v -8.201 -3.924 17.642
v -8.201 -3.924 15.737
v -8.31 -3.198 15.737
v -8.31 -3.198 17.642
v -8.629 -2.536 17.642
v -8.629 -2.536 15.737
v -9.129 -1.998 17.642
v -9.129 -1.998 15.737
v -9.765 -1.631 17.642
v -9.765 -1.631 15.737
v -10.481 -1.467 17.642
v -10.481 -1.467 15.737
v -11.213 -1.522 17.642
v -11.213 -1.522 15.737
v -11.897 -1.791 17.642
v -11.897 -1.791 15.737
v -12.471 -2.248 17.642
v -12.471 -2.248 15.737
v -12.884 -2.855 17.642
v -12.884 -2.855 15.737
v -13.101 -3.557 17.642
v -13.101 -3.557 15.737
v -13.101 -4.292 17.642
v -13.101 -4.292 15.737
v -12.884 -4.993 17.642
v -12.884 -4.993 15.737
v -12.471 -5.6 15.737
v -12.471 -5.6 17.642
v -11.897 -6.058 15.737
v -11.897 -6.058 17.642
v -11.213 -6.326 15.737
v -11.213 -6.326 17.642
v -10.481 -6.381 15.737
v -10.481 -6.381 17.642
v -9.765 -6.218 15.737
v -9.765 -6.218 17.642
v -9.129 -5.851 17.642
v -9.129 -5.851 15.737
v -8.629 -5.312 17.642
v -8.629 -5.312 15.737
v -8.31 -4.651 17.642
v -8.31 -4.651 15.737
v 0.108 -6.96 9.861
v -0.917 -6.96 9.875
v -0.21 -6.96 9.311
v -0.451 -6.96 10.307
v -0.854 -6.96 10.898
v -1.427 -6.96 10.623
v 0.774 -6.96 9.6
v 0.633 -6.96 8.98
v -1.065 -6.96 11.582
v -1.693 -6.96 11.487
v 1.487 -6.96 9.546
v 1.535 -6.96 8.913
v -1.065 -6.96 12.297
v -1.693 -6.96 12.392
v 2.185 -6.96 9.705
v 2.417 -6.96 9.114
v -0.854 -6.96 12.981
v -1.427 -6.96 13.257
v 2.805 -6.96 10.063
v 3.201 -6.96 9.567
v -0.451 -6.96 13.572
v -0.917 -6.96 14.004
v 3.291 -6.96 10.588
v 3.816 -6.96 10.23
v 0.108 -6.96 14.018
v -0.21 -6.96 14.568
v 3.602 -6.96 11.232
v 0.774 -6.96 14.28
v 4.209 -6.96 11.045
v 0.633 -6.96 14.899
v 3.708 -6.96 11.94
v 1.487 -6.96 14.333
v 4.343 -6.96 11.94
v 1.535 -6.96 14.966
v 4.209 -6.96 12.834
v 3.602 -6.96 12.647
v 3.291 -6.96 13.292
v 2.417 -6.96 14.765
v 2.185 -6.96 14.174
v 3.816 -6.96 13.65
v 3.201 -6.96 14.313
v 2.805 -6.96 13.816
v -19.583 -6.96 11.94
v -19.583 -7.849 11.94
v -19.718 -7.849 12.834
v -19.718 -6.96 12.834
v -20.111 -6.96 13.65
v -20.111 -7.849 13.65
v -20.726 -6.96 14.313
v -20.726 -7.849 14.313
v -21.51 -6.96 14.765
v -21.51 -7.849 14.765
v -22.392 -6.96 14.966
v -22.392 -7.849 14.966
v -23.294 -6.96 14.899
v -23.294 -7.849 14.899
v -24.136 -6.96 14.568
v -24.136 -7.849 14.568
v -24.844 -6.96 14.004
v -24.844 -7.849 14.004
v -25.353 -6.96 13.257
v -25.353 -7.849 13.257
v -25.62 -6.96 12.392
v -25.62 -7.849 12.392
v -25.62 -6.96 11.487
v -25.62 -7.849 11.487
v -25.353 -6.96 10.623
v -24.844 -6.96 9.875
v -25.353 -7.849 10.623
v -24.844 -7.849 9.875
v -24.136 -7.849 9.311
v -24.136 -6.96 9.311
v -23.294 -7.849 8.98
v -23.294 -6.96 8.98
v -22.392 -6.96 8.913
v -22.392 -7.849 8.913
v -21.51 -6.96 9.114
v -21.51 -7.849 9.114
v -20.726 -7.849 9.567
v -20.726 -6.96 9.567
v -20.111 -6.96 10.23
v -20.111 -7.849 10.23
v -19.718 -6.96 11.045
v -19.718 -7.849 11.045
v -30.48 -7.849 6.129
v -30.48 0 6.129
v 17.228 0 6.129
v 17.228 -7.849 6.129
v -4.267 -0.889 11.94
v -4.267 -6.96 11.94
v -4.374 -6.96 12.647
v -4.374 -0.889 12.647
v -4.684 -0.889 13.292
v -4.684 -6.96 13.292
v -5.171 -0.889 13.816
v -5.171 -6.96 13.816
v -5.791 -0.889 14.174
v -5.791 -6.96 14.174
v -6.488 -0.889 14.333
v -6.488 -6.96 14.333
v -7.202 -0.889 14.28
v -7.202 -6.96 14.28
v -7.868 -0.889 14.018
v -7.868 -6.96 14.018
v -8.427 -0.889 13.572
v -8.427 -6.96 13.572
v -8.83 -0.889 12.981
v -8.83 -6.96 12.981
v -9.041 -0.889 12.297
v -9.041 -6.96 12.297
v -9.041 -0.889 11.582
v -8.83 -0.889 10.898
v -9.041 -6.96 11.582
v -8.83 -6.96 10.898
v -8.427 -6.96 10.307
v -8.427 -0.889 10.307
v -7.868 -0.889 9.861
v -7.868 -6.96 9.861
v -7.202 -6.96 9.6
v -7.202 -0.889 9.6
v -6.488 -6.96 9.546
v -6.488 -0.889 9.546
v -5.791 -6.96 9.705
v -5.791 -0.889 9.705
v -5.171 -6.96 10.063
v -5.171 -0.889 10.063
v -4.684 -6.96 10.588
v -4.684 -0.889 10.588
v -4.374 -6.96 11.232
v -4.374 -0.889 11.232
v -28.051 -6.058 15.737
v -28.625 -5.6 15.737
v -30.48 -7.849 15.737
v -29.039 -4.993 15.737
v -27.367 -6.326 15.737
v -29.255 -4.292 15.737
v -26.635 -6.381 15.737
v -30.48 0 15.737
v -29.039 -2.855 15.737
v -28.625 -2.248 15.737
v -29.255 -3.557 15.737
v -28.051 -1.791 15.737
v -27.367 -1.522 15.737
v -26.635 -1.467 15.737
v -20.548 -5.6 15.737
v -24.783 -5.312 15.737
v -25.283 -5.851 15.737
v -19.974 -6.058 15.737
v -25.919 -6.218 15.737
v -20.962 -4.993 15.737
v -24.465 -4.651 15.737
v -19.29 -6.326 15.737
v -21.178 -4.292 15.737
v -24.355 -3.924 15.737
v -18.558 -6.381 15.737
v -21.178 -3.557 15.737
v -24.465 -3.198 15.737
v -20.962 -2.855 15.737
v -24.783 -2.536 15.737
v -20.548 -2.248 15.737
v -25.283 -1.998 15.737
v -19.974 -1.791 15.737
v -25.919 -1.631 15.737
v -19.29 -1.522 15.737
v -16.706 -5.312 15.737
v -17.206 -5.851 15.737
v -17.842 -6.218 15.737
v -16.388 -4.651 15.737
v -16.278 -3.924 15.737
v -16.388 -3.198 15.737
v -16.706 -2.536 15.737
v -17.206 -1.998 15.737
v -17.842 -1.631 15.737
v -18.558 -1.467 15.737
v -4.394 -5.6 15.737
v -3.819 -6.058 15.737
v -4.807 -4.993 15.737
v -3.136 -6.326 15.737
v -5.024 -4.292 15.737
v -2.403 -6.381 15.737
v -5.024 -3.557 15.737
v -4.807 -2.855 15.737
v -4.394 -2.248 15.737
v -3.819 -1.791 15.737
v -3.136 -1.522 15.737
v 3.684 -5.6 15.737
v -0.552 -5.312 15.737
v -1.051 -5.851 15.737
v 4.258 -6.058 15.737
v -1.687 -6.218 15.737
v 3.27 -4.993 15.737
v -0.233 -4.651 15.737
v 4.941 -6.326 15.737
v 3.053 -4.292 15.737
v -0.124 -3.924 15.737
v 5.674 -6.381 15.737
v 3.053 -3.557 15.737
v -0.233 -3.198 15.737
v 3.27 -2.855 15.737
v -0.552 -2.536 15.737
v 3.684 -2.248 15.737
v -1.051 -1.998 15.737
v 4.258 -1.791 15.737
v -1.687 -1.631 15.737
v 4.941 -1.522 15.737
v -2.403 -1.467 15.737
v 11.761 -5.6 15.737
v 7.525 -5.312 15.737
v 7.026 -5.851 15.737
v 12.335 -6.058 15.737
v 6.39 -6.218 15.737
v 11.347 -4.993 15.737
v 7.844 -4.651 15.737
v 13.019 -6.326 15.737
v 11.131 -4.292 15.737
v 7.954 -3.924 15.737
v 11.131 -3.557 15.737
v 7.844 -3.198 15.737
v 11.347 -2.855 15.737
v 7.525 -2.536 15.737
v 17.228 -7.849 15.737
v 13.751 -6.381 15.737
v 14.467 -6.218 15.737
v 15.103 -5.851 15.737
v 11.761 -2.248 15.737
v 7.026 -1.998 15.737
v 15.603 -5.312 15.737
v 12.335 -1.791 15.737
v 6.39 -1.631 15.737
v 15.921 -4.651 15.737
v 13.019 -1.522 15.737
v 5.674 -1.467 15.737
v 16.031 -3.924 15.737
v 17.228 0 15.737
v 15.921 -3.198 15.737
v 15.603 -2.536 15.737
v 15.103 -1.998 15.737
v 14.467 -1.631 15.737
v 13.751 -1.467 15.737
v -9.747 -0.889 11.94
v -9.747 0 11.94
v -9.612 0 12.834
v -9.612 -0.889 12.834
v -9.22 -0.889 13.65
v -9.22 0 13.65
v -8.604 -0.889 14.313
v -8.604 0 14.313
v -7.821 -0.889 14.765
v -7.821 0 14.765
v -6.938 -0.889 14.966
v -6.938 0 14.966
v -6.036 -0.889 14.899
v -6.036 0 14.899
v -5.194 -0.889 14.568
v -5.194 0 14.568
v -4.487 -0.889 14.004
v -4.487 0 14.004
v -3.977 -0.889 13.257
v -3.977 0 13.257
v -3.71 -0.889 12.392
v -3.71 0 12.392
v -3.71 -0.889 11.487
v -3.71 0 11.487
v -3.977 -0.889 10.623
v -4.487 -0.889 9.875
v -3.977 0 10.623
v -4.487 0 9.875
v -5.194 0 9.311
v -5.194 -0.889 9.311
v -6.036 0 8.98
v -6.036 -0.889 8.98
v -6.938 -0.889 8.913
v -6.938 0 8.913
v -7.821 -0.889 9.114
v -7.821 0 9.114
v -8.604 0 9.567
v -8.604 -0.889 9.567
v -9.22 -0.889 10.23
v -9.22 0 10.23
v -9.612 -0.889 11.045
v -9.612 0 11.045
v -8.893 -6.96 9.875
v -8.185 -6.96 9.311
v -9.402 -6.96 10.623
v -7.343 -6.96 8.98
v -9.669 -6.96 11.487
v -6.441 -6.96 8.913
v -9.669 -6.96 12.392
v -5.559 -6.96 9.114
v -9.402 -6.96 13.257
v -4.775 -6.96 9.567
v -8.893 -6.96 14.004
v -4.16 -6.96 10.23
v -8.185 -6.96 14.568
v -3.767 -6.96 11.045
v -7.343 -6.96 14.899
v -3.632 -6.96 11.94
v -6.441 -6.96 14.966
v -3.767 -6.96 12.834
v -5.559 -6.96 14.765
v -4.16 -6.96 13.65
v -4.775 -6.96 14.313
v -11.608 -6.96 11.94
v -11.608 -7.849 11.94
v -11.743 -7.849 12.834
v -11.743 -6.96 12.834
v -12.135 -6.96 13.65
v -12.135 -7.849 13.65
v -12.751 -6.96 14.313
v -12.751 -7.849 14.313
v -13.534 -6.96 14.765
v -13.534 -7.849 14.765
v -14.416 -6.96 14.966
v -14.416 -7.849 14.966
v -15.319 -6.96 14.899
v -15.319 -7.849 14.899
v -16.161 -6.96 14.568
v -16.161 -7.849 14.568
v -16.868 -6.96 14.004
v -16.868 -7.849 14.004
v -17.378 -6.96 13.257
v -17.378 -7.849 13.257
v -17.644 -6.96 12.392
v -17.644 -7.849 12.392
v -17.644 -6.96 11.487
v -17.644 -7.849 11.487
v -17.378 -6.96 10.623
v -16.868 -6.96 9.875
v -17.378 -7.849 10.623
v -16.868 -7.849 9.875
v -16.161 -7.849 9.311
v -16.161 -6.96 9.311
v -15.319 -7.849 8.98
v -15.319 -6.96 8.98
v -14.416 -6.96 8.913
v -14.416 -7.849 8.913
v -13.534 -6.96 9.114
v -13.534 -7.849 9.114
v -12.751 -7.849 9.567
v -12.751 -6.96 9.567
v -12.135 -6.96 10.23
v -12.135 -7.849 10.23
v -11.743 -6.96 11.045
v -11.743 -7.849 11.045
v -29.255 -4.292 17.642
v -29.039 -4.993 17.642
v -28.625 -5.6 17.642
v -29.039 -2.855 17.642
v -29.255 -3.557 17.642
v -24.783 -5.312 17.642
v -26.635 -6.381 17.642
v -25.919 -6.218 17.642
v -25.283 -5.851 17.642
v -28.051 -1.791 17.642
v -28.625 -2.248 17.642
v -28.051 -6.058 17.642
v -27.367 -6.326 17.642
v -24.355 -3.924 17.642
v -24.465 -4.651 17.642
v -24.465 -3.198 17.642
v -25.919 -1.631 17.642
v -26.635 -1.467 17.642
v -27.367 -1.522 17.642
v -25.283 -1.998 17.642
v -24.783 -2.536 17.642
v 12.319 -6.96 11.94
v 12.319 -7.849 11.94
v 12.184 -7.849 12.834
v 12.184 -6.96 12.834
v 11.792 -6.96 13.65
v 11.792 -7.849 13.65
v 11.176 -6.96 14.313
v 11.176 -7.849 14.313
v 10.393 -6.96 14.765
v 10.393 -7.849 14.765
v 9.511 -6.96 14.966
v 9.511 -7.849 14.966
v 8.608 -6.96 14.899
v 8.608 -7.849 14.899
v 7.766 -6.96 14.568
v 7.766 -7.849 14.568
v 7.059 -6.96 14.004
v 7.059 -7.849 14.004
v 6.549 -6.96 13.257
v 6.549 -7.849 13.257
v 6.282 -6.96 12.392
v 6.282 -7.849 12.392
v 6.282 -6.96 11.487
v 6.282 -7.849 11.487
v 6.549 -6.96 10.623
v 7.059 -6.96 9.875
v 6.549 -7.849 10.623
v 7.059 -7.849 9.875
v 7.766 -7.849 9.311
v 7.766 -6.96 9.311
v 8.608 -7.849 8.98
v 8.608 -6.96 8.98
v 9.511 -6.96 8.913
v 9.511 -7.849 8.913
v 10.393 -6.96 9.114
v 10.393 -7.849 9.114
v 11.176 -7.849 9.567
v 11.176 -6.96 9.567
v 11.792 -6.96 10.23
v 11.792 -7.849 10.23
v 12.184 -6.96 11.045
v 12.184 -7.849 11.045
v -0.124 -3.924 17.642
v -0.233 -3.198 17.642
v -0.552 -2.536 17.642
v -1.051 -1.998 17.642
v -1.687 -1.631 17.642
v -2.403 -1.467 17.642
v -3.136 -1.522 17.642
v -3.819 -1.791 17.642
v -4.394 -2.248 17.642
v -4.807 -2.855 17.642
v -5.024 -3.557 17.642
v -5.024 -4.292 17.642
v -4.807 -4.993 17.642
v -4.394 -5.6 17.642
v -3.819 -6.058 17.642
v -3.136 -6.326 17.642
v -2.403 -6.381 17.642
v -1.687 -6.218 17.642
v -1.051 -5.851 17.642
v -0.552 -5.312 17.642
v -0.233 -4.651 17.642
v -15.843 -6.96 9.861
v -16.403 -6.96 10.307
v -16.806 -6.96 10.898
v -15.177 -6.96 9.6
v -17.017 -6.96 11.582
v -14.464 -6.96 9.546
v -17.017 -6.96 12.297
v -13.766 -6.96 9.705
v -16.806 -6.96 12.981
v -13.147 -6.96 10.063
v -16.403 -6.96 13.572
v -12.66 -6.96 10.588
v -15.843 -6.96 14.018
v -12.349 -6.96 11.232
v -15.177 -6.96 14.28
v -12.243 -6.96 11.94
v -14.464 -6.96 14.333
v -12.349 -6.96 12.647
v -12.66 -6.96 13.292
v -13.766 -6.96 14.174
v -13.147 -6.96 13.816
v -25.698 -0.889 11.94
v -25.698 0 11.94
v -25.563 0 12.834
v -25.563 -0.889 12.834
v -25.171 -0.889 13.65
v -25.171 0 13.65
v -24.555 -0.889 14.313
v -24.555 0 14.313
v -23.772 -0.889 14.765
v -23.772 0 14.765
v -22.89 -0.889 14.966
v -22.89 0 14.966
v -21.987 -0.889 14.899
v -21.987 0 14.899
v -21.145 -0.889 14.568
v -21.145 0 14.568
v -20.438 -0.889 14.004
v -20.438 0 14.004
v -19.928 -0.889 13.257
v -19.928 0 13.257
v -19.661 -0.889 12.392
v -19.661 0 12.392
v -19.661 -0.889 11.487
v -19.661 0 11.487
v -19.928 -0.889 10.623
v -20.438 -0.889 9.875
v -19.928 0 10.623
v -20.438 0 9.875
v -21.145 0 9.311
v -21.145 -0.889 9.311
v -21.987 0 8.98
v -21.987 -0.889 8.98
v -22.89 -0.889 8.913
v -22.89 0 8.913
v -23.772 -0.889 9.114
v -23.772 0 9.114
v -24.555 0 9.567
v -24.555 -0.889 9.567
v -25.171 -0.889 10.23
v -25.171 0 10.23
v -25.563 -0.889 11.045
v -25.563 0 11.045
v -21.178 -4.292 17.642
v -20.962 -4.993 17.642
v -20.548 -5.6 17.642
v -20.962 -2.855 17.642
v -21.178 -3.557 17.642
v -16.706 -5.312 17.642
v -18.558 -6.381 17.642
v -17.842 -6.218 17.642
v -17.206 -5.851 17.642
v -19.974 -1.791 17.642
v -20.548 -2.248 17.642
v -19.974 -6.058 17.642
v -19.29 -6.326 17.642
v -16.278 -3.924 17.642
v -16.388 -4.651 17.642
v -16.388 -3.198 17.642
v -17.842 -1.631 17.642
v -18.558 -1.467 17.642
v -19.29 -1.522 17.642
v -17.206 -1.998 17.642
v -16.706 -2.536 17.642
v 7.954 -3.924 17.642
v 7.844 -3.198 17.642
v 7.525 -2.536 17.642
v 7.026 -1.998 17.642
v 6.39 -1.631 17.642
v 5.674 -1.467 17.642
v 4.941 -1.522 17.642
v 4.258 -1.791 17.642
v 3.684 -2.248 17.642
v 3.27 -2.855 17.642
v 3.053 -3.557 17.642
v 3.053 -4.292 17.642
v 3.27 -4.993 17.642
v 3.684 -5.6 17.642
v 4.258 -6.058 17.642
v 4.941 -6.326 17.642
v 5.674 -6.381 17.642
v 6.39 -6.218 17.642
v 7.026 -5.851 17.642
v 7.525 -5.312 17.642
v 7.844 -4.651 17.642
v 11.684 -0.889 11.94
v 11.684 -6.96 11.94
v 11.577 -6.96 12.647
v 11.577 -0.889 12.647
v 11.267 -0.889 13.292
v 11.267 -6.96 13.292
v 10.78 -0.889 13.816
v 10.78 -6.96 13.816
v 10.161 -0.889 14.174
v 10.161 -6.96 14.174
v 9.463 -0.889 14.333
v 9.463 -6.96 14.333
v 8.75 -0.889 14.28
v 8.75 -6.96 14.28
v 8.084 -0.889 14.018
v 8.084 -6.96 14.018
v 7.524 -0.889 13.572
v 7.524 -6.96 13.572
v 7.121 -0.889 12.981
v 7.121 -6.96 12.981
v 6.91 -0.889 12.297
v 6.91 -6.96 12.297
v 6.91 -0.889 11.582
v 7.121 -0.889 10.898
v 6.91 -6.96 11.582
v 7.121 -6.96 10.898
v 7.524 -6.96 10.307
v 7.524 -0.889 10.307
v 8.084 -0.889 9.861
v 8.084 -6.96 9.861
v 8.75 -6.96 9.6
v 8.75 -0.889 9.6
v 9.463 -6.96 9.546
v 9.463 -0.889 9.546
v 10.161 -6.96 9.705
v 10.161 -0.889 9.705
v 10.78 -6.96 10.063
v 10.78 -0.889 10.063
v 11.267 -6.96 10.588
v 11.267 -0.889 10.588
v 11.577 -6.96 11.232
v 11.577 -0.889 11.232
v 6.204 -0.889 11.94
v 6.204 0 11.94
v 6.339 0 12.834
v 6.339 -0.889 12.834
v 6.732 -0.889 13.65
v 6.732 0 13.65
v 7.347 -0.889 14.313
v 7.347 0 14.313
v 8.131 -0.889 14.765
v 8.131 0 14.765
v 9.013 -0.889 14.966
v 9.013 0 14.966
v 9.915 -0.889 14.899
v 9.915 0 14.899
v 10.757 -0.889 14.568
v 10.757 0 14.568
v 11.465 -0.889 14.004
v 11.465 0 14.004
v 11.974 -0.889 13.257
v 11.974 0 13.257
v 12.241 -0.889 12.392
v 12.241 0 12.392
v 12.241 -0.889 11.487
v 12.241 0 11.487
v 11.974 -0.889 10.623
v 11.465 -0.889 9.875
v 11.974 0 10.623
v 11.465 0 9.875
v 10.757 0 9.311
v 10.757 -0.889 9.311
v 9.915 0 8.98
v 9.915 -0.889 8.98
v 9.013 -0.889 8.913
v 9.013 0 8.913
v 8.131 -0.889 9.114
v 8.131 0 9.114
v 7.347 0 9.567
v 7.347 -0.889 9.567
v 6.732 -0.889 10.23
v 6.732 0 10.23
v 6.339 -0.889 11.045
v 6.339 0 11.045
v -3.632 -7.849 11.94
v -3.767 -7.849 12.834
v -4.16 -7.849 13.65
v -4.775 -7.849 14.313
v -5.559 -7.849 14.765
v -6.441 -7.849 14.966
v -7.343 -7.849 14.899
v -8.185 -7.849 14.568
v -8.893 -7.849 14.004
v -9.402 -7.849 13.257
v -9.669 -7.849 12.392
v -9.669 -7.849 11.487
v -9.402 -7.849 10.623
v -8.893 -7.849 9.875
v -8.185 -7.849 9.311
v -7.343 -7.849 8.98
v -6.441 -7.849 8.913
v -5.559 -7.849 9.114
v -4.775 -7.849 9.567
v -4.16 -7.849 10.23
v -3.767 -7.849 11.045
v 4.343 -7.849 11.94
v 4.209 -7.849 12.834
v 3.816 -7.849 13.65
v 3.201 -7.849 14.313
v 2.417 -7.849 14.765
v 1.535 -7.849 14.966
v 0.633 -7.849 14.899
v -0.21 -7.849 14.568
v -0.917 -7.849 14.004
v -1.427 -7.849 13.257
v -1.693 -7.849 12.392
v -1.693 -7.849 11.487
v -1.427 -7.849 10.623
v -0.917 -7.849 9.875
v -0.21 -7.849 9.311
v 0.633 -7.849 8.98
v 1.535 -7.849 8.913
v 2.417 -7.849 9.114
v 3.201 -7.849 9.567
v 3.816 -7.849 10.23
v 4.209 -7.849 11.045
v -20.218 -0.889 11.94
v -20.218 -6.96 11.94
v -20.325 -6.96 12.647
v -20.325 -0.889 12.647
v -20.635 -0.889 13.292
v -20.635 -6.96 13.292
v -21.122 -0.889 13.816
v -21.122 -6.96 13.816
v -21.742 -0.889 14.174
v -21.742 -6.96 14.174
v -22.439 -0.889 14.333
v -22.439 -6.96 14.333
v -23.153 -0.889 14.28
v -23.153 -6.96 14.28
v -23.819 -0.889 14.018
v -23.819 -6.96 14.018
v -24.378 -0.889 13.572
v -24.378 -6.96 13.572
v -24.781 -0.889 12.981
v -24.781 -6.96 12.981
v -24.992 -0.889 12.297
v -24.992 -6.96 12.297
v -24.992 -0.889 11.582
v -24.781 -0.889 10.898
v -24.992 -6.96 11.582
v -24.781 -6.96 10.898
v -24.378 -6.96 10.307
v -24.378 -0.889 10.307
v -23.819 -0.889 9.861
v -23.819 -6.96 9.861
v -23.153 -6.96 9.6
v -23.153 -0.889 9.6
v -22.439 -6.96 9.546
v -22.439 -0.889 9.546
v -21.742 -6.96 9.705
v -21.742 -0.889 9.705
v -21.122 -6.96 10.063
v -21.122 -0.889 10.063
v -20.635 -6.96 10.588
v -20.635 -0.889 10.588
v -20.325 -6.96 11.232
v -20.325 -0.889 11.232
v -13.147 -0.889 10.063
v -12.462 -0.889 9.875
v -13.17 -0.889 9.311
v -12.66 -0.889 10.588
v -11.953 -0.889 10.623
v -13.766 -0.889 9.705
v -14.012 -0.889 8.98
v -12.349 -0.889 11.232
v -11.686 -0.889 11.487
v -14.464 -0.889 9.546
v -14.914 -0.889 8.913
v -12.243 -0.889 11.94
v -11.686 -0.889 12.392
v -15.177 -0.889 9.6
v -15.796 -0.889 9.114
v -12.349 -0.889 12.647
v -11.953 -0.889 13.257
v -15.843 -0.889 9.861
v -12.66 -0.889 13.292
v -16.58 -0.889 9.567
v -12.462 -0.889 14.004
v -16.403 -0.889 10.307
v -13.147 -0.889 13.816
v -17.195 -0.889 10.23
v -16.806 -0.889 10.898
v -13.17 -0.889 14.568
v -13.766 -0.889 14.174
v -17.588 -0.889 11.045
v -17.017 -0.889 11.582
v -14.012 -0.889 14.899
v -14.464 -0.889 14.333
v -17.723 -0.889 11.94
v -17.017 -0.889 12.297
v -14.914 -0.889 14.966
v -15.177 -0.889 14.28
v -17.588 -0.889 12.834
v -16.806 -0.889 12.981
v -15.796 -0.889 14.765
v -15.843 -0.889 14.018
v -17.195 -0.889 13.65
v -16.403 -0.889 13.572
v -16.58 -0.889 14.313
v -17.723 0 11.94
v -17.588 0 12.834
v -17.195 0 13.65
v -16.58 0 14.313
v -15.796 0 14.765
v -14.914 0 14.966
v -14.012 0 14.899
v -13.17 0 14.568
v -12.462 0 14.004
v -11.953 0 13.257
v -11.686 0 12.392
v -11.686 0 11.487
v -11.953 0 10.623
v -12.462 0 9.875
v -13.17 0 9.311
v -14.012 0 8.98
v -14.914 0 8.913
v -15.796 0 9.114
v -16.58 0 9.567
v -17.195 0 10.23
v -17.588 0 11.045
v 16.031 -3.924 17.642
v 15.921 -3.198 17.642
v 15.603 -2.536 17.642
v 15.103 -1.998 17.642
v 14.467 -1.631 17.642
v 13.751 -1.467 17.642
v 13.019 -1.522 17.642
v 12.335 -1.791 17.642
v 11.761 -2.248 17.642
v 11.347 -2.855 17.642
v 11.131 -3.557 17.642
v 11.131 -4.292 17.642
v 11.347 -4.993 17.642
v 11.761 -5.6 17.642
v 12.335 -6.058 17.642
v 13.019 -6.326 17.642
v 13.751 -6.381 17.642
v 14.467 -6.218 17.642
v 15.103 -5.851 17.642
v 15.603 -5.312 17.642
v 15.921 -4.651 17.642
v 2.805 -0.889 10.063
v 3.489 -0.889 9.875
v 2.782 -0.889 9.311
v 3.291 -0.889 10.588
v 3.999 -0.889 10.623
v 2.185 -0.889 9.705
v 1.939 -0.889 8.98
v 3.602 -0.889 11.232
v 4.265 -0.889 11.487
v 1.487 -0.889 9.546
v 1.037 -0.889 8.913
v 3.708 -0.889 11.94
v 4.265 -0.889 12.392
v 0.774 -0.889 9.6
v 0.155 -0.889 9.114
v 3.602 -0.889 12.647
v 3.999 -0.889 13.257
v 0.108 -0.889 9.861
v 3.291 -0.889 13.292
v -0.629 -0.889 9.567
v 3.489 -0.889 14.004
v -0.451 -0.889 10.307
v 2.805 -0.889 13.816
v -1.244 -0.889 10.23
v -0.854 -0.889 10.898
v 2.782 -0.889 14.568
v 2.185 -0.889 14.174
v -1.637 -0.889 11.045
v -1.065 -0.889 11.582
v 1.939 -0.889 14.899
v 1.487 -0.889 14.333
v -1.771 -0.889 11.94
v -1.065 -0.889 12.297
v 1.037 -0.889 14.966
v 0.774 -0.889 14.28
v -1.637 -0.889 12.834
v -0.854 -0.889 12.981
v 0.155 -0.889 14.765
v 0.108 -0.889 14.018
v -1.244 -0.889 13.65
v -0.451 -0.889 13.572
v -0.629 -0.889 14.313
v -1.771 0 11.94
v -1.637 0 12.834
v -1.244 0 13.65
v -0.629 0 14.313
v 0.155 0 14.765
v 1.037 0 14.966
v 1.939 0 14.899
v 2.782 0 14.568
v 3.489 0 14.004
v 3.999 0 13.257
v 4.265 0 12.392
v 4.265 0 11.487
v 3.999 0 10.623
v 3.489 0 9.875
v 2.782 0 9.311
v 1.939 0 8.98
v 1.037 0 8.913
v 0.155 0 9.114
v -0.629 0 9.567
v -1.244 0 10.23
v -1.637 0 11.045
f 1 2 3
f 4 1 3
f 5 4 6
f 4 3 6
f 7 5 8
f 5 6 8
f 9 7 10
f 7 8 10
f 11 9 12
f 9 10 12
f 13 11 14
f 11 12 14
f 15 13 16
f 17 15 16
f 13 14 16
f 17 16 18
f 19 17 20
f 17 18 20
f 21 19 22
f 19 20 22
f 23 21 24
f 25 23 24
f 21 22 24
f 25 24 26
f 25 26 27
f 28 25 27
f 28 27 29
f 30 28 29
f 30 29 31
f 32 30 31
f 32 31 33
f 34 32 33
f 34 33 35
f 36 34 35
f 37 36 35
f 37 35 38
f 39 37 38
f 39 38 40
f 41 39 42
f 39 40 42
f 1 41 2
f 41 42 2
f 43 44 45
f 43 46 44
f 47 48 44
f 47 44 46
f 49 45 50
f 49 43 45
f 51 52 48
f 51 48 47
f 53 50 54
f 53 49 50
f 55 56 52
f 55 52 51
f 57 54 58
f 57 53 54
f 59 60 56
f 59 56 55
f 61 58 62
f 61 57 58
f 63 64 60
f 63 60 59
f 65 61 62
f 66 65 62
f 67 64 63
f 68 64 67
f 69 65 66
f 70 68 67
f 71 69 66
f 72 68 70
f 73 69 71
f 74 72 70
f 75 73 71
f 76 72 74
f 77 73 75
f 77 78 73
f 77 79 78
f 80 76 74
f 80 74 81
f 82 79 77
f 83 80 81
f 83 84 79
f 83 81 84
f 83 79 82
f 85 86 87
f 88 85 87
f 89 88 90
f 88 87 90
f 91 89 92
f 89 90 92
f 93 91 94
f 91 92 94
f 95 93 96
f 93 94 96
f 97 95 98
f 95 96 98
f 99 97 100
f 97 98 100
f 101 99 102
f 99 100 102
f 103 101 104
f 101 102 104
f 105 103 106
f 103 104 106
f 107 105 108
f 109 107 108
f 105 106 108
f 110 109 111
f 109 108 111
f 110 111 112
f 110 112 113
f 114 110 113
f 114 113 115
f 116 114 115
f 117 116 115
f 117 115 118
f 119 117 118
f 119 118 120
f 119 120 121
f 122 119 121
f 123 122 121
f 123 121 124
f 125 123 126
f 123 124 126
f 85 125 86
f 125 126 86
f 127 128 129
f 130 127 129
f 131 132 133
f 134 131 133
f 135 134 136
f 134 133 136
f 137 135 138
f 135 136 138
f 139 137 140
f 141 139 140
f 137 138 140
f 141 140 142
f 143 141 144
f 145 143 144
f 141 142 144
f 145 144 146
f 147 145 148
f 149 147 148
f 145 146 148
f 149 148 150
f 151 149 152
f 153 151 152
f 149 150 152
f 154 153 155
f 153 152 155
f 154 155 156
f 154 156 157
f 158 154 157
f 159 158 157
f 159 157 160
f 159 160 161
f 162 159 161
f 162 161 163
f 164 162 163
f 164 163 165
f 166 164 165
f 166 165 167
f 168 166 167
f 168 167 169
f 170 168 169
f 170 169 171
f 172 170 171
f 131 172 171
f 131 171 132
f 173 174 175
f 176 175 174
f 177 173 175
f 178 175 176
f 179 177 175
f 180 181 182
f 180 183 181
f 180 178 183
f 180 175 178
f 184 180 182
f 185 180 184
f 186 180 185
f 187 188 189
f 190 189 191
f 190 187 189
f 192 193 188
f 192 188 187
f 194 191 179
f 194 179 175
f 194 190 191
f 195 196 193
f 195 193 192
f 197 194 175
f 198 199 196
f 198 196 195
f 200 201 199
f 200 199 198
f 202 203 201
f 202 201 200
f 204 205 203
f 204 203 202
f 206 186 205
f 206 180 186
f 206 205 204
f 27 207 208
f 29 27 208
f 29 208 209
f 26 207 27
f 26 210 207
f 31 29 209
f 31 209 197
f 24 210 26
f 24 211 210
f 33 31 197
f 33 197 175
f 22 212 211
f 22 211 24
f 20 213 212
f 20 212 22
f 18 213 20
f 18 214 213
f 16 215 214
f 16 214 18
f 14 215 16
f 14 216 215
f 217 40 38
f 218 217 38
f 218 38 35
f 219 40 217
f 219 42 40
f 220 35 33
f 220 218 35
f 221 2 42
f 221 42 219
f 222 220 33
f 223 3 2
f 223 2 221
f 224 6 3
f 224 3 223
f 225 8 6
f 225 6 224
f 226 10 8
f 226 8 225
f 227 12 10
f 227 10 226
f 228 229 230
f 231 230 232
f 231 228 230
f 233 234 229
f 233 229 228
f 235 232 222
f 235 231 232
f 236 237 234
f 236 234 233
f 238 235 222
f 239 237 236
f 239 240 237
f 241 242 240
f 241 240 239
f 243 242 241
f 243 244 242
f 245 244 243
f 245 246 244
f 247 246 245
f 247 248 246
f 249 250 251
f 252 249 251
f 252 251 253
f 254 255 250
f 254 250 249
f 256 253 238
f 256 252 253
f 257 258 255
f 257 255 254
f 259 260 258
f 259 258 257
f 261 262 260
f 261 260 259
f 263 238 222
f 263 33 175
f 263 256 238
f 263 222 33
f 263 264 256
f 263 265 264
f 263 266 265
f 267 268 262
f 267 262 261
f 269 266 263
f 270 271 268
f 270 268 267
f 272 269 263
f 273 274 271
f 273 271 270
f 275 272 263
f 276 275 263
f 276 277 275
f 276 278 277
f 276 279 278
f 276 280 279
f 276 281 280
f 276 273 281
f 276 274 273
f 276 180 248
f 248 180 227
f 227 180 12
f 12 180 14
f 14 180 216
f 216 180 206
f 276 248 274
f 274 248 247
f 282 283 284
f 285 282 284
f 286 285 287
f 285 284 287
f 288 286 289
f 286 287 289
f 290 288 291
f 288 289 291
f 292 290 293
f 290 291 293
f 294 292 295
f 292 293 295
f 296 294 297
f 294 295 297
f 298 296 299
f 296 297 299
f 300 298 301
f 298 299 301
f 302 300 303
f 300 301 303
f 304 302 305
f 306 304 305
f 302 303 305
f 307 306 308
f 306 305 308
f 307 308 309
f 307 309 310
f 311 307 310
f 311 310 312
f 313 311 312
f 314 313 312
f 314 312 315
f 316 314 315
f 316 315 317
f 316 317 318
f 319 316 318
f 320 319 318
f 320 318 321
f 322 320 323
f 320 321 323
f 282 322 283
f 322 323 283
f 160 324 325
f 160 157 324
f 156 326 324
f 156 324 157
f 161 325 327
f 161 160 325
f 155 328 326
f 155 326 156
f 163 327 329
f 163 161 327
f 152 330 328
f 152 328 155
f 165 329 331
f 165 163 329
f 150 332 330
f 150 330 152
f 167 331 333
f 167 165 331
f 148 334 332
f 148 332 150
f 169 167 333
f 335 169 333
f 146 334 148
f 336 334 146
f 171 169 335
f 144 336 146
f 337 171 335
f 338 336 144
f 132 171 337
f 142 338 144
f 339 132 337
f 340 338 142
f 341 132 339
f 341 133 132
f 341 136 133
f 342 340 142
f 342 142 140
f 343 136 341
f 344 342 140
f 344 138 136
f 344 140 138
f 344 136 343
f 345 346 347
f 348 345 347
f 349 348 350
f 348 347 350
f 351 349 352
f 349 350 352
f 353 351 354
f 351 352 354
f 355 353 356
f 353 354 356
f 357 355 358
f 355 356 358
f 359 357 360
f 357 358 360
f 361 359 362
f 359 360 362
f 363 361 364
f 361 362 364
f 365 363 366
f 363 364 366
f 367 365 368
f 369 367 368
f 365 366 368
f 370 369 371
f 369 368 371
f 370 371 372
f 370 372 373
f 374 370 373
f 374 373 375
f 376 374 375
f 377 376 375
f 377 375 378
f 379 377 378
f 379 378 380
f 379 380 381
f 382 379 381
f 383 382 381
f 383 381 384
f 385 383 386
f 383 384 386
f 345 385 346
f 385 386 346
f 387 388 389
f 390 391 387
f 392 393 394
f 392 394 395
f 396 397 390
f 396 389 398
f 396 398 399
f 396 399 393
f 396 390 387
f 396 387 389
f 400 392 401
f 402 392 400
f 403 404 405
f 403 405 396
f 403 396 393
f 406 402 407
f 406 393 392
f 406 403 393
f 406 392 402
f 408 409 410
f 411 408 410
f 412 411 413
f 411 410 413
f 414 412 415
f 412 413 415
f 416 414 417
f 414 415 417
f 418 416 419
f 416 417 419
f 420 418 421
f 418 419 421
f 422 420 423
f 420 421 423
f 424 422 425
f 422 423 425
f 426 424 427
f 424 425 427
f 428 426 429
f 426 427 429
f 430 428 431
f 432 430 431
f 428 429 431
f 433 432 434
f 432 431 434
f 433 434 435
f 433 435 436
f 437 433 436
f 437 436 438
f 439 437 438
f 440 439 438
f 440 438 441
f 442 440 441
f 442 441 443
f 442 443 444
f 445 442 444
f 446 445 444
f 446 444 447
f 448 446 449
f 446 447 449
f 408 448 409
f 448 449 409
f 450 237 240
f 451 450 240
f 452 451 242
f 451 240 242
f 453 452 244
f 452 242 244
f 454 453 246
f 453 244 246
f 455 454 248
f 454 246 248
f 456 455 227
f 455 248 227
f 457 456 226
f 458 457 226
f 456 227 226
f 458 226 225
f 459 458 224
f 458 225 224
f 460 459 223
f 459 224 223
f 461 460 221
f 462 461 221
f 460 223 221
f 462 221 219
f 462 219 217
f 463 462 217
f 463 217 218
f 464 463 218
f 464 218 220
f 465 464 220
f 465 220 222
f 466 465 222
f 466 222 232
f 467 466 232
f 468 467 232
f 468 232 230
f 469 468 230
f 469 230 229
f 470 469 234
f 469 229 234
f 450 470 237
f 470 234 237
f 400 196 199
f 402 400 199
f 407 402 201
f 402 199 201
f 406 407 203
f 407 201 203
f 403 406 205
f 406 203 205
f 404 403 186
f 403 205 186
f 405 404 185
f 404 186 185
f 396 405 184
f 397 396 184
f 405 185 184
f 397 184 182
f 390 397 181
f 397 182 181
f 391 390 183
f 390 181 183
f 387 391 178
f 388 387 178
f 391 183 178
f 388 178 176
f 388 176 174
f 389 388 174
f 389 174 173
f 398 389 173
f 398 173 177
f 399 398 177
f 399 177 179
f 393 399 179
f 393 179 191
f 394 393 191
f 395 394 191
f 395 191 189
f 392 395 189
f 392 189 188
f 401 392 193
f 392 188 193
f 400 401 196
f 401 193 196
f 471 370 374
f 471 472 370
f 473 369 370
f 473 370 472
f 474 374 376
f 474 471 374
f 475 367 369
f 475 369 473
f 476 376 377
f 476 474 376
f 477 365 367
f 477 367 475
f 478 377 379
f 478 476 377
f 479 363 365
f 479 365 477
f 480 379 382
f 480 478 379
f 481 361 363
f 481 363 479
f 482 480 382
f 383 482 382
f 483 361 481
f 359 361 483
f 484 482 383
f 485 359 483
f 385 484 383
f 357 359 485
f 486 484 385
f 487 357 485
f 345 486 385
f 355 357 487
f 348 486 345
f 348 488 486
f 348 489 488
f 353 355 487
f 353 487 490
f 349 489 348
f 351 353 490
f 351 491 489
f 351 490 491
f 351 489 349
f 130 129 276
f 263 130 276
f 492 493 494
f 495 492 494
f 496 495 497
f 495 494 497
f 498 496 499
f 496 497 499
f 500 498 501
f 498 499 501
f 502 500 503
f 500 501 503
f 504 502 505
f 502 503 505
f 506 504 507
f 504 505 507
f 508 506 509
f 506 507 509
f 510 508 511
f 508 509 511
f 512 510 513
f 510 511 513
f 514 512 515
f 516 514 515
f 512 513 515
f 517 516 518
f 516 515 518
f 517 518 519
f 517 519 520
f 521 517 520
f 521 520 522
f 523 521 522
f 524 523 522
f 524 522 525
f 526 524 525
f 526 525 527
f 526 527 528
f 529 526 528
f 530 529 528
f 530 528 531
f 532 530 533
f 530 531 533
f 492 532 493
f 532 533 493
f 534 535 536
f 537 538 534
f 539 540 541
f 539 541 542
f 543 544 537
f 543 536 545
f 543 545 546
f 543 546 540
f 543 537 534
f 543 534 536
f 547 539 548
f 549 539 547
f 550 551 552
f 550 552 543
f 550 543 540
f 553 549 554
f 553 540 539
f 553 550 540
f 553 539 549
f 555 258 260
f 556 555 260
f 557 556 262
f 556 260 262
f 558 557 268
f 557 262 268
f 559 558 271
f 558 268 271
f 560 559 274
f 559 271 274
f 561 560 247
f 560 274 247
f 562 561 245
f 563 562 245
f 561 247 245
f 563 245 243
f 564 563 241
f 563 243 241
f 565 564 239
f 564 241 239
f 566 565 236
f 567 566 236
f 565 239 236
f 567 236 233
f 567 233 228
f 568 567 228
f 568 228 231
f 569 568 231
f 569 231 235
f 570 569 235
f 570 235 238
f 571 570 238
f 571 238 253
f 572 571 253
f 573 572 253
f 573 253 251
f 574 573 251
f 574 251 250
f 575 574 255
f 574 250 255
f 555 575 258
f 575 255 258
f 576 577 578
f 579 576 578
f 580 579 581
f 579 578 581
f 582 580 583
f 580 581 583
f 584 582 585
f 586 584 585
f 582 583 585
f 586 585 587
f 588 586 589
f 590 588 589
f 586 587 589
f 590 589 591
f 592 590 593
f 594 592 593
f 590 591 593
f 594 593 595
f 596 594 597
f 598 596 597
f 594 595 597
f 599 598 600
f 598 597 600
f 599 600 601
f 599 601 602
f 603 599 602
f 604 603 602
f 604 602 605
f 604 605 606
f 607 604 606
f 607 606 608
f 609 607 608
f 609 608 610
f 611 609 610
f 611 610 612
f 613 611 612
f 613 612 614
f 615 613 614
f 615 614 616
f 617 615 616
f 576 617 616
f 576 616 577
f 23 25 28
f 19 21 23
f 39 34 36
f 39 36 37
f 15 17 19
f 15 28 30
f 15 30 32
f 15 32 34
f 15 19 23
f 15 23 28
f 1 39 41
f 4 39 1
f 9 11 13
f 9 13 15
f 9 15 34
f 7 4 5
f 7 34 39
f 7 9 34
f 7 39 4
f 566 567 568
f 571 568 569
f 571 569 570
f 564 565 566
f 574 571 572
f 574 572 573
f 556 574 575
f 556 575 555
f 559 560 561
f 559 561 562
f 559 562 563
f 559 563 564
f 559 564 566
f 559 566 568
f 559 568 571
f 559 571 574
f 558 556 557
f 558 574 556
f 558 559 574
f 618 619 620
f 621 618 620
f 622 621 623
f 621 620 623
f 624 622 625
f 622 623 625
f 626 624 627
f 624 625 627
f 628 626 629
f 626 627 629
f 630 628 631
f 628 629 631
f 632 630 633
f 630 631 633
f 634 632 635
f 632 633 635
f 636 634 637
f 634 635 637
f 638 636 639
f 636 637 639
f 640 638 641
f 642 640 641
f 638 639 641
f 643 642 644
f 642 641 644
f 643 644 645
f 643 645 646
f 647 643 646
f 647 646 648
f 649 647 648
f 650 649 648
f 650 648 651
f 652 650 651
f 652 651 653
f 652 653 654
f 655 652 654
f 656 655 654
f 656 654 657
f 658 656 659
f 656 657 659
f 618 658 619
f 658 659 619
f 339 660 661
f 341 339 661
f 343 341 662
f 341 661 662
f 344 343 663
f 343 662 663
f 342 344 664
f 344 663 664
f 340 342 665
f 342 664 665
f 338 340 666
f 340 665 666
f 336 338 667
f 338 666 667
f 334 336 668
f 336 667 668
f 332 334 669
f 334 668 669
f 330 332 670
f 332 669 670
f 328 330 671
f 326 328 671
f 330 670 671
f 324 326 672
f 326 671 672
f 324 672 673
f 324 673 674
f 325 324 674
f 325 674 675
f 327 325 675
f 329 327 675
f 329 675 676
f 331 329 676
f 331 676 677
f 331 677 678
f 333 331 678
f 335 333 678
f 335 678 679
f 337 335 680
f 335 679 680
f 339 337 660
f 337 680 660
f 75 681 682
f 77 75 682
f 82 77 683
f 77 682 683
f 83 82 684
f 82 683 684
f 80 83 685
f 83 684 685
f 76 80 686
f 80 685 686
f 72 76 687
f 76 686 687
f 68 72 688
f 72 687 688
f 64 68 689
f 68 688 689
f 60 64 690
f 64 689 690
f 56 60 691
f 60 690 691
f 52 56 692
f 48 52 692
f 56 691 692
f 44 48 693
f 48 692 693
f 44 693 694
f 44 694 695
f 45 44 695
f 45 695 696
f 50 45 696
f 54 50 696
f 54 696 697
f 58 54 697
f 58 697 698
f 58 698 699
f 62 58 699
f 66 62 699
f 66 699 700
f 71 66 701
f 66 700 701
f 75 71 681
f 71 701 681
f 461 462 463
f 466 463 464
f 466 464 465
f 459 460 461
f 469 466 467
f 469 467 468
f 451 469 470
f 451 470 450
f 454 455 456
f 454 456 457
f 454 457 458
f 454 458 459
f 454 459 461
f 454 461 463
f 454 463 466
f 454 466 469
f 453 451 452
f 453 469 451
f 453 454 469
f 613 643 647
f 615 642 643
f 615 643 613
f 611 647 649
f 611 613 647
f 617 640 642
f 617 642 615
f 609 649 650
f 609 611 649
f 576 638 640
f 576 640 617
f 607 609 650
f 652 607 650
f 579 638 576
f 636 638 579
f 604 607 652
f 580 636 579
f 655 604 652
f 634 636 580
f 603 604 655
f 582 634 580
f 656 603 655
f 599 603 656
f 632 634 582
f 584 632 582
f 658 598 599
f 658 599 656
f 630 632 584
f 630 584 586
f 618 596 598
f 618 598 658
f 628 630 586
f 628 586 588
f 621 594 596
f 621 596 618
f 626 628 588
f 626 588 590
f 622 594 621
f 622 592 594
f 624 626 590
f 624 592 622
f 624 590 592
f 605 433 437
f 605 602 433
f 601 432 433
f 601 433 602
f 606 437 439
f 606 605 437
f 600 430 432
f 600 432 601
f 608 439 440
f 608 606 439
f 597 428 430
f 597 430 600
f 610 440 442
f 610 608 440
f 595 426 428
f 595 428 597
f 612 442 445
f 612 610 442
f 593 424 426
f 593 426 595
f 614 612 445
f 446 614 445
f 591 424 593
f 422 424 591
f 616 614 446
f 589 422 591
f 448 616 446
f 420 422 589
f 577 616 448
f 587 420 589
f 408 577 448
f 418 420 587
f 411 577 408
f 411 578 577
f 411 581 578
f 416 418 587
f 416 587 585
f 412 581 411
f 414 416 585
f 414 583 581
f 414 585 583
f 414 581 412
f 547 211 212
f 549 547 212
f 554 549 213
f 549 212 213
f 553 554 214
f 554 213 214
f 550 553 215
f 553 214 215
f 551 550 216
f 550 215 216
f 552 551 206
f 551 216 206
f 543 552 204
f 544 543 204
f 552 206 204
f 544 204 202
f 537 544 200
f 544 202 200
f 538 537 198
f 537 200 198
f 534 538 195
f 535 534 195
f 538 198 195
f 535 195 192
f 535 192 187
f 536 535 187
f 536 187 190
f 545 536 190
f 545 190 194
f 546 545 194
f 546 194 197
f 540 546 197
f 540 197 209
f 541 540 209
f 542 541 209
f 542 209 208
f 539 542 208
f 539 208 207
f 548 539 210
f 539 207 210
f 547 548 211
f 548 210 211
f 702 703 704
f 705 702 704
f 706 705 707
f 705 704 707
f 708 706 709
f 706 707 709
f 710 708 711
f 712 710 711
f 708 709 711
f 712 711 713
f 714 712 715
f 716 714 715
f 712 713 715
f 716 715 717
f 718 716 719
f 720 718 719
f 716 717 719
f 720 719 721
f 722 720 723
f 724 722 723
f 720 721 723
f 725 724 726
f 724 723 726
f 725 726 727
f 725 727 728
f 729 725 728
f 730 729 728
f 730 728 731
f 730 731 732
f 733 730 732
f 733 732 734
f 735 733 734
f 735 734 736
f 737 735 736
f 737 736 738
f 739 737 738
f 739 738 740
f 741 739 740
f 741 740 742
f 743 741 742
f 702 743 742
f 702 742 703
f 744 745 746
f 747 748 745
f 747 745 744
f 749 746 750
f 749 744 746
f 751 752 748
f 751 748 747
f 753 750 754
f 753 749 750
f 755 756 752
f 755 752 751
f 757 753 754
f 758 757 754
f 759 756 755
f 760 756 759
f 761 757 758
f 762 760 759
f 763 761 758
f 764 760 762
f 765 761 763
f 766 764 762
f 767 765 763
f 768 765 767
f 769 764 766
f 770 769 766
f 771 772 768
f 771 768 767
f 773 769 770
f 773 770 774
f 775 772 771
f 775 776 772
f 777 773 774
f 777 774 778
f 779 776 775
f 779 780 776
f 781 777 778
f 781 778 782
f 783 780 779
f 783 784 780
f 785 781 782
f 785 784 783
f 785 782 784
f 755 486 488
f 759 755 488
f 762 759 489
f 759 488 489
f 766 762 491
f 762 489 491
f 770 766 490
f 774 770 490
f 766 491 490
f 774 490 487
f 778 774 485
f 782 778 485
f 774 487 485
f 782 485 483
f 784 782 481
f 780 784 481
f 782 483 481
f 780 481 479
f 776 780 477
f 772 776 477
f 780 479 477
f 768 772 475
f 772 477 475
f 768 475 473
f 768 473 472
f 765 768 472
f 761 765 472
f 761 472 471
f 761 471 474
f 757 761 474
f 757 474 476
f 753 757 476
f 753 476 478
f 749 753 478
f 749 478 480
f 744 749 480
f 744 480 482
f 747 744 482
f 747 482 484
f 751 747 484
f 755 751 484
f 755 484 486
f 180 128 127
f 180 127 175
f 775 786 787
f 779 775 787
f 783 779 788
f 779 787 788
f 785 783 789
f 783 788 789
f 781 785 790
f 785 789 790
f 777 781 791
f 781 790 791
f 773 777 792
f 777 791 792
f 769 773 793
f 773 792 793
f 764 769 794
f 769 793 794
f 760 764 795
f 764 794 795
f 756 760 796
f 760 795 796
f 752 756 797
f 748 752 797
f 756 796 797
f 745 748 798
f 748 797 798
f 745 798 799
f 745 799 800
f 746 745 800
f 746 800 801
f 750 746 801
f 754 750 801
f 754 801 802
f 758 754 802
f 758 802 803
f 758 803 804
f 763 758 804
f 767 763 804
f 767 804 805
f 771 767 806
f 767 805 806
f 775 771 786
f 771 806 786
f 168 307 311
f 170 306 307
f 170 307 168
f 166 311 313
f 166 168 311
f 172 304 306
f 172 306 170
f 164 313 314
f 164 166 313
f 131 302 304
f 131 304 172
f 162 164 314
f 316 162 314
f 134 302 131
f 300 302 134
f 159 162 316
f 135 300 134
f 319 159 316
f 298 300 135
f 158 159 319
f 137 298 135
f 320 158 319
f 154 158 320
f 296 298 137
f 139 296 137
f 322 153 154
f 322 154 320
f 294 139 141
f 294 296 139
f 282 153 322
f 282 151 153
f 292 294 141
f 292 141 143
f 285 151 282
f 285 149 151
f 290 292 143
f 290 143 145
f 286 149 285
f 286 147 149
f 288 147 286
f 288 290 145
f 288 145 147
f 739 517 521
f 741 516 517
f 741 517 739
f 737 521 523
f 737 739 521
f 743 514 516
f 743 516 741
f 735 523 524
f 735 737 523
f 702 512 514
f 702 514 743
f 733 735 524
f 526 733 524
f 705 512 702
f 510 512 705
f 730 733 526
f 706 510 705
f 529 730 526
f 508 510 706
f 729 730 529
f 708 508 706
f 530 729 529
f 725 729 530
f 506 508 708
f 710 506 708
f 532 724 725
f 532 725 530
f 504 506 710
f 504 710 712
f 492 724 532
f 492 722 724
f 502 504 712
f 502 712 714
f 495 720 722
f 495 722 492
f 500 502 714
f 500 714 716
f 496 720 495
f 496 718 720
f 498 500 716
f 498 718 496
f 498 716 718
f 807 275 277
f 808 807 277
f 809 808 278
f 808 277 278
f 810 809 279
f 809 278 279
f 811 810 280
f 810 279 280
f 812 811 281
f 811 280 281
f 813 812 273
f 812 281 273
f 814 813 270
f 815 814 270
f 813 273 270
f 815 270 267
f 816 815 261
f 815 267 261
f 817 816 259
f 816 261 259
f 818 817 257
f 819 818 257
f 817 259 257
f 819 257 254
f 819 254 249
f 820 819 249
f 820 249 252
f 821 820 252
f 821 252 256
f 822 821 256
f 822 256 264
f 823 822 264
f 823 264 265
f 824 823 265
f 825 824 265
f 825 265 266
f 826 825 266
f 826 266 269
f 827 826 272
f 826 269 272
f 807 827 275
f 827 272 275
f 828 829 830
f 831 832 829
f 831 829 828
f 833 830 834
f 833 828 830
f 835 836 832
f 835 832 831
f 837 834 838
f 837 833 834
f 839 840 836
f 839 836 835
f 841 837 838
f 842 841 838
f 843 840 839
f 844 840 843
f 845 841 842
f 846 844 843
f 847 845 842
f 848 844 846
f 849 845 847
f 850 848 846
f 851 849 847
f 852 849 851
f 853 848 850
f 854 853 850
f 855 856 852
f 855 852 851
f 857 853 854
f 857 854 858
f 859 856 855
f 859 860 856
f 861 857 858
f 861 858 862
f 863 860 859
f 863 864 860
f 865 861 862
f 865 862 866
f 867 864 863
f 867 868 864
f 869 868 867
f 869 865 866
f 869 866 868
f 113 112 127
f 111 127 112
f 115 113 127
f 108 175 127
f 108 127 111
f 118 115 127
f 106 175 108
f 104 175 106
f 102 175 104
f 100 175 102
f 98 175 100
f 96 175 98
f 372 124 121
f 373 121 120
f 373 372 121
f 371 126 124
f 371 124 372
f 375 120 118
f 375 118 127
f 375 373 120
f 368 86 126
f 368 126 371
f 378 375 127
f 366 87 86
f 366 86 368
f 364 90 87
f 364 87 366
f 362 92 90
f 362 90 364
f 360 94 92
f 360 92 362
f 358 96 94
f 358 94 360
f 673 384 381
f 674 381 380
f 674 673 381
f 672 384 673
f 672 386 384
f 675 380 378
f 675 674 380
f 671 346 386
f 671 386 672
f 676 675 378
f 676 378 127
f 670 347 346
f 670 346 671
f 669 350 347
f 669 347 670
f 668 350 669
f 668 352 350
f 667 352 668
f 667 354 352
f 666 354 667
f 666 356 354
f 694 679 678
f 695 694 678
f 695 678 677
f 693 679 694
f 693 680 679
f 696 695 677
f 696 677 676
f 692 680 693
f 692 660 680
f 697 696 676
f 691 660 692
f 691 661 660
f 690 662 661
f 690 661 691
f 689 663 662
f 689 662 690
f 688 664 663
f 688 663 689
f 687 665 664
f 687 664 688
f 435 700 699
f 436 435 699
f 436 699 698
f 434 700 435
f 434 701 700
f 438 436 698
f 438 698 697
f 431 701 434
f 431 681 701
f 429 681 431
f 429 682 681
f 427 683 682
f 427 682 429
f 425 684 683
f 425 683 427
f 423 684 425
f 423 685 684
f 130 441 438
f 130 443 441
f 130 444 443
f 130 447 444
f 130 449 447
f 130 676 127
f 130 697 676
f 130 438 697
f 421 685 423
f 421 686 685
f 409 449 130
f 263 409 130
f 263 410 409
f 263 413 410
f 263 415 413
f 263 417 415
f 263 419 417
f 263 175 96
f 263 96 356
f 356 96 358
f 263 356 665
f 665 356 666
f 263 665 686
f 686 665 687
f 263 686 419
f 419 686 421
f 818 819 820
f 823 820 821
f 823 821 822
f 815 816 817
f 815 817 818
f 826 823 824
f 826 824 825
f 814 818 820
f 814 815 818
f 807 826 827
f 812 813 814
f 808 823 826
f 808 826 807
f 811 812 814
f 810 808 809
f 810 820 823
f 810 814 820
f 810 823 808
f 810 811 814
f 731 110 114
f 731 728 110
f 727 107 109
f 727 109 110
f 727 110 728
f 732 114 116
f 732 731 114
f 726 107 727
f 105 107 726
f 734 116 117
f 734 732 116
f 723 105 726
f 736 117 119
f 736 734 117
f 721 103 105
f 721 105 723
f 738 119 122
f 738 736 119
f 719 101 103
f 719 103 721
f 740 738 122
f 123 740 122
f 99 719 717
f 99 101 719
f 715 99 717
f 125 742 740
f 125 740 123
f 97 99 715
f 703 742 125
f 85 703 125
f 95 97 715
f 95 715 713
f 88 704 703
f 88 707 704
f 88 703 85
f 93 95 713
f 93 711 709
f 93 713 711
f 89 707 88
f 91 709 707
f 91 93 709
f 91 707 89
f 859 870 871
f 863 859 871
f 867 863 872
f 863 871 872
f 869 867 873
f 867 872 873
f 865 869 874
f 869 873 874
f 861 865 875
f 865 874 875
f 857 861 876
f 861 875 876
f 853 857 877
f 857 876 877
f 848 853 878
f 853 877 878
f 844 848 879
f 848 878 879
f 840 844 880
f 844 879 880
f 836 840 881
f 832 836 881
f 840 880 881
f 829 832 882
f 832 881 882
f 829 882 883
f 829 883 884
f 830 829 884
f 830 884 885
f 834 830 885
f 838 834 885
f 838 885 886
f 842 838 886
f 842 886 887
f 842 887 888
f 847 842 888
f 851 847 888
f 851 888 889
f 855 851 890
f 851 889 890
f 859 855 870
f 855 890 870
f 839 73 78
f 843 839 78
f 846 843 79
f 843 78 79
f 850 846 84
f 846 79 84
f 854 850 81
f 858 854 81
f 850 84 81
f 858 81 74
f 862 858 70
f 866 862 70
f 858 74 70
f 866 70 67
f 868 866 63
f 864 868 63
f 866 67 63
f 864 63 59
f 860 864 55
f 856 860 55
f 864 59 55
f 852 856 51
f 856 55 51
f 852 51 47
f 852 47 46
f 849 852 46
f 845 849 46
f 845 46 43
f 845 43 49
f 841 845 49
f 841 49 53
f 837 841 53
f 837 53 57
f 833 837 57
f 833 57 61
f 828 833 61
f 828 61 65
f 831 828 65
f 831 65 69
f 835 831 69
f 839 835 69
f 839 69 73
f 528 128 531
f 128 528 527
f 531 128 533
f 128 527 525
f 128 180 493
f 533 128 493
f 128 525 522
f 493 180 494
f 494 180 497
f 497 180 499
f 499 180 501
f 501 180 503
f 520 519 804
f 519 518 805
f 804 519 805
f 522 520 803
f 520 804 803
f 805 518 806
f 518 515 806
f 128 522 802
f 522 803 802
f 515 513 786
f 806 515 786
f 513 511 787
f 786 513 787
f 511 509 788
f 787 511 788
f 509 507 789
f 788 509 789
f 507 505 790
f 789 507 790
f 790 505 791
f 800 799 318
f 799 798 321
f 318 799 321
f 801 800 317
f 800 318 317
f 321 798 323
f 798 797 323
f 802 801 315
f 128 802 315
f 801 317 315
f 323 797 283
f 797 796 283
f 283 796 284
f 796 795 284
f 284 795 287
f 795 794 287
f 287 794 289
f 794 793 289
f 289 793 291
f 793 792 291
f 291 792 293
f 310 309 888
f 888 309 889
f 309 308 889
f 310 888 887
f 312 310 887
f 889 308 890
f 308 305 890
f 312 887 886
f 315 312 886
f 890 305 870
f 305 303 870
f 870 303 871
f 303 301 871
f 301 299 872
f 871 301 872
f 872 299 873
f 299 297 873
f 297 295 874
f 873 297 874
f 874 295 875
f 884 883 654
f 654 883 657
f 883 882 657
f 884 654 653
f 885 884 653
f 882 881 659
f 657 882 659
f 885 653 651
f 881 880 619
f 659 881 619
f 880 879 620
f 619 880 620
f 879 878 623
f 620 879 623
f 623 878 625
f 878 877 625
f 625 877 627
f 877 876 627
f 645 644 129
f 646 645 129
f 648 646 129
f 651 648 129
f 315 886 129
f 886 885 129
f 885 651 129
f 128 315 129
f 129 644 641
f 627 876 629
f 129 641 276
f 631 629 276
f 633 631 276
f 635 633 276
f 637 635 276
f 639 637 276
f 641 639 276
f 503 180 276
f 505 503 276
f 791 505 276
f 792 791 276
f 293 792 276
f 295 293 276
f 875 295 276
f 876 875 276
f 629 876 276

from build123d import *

# Parameters (mm, degrees)
F0_W     = 47.70783
F0_H     = 9.607826
F1_DEPTH = 7.8486
F2_R     = 3.0353
F3_DEPTH = 0.889
F4_R     = 3.0353
F5_DEPTH = 0.889
F6_R     = 2.4003
F7_DEPTH = 7.8496
F8_R     = 2.4638
F9_DEPTH = 1.905


with BuildPart() as f1:
    # F0 (on Front) → F1 (new body)
    with BuildSketch(Plane.XZ):
        with Locations((-6.626086, 10.933043)):
            Rectangle(F0_W, F0_H)
    extrude(amount=F1_DEPTH)

    # F2 (on face) → F3 (cut)
    with BuildSketch(Plane.XZ.offset(7.8486)):
        with Locations((-22.618701, 11.939656)):
            Circle(F2_R)
        with Locations((-14.643101, 11.939656)):
            Circle(F2_R)
        with Locations((-6.667501, 11.939656)):
            Circle(F2_R)
        with Locations((1.308099, 11.939656)):
            Circle(F2_R)
        with Locations((9.283699, 11.939656)):
            Circle(F2_R)
    extrude(amount=-F3_DEPTH, mode=Mode.SUBTRACT)

    # F4 (on face) → F5 (cut)
    with BuildSketch(Plane(origin=(0, 0, 0), x_dir=(-1, 0, 0), z_dir=(0, 1, 0))):
        with Locations((-9.239529, 11.939656)):
            Circle(F4_R)
        with Locations((-1.263929, 11.939656)):
            Circle(F4_R)
        with Locations((6.711671, 11.939656)):
            Circle(F4_R)
        with Locations((14.687271, 11.939656)):
            Circle(F4_R)
        with Locations((22.662871, 11.939656)):
            Circle(F4_R)
    extrude(amount=-F5_DEPTH, mode=Mode.SUBTRACT)

    # F6 (on face) → F7 (cut, through all)
    with BuildSketch(Plane.XZ.offset(7.8486)):
        with Locations((-22.618701, 11.939656)):
            Circle(F6_R)
        with Locations((-14.643101, 11.939656)):
            Circle(F6_R)
        with Locations((-6.667501, 11.939656)):
            Circle(F6_R)
        with Locations((1.308099, 11.939656)):
            Circle(F6_R)
        with Locations((9.283699, 11.939656)):
            Circle(F6_R)
    extrude(amount=-F7_DEPTH, mode=Mode.SUBTRACT)

    # F8 (on face) → F9 (join)
    with BuildSketch(Plane.XY.offset(15.736956)):
        with Locations((-26.819086, -3.9243)):
            Circle(F8_R)
        with Locations((-18.741886, -3.9243)):
            Circle(F8_R)
        with Locations((-10.664686, -3.9243)):
            Circle(F8_R)
        with Locations((-2.587486, -3.9243)):
            Circle(F8_R)
        with Locations((5.489714, -3.9243)):
            Circle(F8_R)
        with Locations((13.566914, -3.9243)):
            Circle(F8_R)
    extrude(amount=F9_DEPTH)


solid = f1.part
